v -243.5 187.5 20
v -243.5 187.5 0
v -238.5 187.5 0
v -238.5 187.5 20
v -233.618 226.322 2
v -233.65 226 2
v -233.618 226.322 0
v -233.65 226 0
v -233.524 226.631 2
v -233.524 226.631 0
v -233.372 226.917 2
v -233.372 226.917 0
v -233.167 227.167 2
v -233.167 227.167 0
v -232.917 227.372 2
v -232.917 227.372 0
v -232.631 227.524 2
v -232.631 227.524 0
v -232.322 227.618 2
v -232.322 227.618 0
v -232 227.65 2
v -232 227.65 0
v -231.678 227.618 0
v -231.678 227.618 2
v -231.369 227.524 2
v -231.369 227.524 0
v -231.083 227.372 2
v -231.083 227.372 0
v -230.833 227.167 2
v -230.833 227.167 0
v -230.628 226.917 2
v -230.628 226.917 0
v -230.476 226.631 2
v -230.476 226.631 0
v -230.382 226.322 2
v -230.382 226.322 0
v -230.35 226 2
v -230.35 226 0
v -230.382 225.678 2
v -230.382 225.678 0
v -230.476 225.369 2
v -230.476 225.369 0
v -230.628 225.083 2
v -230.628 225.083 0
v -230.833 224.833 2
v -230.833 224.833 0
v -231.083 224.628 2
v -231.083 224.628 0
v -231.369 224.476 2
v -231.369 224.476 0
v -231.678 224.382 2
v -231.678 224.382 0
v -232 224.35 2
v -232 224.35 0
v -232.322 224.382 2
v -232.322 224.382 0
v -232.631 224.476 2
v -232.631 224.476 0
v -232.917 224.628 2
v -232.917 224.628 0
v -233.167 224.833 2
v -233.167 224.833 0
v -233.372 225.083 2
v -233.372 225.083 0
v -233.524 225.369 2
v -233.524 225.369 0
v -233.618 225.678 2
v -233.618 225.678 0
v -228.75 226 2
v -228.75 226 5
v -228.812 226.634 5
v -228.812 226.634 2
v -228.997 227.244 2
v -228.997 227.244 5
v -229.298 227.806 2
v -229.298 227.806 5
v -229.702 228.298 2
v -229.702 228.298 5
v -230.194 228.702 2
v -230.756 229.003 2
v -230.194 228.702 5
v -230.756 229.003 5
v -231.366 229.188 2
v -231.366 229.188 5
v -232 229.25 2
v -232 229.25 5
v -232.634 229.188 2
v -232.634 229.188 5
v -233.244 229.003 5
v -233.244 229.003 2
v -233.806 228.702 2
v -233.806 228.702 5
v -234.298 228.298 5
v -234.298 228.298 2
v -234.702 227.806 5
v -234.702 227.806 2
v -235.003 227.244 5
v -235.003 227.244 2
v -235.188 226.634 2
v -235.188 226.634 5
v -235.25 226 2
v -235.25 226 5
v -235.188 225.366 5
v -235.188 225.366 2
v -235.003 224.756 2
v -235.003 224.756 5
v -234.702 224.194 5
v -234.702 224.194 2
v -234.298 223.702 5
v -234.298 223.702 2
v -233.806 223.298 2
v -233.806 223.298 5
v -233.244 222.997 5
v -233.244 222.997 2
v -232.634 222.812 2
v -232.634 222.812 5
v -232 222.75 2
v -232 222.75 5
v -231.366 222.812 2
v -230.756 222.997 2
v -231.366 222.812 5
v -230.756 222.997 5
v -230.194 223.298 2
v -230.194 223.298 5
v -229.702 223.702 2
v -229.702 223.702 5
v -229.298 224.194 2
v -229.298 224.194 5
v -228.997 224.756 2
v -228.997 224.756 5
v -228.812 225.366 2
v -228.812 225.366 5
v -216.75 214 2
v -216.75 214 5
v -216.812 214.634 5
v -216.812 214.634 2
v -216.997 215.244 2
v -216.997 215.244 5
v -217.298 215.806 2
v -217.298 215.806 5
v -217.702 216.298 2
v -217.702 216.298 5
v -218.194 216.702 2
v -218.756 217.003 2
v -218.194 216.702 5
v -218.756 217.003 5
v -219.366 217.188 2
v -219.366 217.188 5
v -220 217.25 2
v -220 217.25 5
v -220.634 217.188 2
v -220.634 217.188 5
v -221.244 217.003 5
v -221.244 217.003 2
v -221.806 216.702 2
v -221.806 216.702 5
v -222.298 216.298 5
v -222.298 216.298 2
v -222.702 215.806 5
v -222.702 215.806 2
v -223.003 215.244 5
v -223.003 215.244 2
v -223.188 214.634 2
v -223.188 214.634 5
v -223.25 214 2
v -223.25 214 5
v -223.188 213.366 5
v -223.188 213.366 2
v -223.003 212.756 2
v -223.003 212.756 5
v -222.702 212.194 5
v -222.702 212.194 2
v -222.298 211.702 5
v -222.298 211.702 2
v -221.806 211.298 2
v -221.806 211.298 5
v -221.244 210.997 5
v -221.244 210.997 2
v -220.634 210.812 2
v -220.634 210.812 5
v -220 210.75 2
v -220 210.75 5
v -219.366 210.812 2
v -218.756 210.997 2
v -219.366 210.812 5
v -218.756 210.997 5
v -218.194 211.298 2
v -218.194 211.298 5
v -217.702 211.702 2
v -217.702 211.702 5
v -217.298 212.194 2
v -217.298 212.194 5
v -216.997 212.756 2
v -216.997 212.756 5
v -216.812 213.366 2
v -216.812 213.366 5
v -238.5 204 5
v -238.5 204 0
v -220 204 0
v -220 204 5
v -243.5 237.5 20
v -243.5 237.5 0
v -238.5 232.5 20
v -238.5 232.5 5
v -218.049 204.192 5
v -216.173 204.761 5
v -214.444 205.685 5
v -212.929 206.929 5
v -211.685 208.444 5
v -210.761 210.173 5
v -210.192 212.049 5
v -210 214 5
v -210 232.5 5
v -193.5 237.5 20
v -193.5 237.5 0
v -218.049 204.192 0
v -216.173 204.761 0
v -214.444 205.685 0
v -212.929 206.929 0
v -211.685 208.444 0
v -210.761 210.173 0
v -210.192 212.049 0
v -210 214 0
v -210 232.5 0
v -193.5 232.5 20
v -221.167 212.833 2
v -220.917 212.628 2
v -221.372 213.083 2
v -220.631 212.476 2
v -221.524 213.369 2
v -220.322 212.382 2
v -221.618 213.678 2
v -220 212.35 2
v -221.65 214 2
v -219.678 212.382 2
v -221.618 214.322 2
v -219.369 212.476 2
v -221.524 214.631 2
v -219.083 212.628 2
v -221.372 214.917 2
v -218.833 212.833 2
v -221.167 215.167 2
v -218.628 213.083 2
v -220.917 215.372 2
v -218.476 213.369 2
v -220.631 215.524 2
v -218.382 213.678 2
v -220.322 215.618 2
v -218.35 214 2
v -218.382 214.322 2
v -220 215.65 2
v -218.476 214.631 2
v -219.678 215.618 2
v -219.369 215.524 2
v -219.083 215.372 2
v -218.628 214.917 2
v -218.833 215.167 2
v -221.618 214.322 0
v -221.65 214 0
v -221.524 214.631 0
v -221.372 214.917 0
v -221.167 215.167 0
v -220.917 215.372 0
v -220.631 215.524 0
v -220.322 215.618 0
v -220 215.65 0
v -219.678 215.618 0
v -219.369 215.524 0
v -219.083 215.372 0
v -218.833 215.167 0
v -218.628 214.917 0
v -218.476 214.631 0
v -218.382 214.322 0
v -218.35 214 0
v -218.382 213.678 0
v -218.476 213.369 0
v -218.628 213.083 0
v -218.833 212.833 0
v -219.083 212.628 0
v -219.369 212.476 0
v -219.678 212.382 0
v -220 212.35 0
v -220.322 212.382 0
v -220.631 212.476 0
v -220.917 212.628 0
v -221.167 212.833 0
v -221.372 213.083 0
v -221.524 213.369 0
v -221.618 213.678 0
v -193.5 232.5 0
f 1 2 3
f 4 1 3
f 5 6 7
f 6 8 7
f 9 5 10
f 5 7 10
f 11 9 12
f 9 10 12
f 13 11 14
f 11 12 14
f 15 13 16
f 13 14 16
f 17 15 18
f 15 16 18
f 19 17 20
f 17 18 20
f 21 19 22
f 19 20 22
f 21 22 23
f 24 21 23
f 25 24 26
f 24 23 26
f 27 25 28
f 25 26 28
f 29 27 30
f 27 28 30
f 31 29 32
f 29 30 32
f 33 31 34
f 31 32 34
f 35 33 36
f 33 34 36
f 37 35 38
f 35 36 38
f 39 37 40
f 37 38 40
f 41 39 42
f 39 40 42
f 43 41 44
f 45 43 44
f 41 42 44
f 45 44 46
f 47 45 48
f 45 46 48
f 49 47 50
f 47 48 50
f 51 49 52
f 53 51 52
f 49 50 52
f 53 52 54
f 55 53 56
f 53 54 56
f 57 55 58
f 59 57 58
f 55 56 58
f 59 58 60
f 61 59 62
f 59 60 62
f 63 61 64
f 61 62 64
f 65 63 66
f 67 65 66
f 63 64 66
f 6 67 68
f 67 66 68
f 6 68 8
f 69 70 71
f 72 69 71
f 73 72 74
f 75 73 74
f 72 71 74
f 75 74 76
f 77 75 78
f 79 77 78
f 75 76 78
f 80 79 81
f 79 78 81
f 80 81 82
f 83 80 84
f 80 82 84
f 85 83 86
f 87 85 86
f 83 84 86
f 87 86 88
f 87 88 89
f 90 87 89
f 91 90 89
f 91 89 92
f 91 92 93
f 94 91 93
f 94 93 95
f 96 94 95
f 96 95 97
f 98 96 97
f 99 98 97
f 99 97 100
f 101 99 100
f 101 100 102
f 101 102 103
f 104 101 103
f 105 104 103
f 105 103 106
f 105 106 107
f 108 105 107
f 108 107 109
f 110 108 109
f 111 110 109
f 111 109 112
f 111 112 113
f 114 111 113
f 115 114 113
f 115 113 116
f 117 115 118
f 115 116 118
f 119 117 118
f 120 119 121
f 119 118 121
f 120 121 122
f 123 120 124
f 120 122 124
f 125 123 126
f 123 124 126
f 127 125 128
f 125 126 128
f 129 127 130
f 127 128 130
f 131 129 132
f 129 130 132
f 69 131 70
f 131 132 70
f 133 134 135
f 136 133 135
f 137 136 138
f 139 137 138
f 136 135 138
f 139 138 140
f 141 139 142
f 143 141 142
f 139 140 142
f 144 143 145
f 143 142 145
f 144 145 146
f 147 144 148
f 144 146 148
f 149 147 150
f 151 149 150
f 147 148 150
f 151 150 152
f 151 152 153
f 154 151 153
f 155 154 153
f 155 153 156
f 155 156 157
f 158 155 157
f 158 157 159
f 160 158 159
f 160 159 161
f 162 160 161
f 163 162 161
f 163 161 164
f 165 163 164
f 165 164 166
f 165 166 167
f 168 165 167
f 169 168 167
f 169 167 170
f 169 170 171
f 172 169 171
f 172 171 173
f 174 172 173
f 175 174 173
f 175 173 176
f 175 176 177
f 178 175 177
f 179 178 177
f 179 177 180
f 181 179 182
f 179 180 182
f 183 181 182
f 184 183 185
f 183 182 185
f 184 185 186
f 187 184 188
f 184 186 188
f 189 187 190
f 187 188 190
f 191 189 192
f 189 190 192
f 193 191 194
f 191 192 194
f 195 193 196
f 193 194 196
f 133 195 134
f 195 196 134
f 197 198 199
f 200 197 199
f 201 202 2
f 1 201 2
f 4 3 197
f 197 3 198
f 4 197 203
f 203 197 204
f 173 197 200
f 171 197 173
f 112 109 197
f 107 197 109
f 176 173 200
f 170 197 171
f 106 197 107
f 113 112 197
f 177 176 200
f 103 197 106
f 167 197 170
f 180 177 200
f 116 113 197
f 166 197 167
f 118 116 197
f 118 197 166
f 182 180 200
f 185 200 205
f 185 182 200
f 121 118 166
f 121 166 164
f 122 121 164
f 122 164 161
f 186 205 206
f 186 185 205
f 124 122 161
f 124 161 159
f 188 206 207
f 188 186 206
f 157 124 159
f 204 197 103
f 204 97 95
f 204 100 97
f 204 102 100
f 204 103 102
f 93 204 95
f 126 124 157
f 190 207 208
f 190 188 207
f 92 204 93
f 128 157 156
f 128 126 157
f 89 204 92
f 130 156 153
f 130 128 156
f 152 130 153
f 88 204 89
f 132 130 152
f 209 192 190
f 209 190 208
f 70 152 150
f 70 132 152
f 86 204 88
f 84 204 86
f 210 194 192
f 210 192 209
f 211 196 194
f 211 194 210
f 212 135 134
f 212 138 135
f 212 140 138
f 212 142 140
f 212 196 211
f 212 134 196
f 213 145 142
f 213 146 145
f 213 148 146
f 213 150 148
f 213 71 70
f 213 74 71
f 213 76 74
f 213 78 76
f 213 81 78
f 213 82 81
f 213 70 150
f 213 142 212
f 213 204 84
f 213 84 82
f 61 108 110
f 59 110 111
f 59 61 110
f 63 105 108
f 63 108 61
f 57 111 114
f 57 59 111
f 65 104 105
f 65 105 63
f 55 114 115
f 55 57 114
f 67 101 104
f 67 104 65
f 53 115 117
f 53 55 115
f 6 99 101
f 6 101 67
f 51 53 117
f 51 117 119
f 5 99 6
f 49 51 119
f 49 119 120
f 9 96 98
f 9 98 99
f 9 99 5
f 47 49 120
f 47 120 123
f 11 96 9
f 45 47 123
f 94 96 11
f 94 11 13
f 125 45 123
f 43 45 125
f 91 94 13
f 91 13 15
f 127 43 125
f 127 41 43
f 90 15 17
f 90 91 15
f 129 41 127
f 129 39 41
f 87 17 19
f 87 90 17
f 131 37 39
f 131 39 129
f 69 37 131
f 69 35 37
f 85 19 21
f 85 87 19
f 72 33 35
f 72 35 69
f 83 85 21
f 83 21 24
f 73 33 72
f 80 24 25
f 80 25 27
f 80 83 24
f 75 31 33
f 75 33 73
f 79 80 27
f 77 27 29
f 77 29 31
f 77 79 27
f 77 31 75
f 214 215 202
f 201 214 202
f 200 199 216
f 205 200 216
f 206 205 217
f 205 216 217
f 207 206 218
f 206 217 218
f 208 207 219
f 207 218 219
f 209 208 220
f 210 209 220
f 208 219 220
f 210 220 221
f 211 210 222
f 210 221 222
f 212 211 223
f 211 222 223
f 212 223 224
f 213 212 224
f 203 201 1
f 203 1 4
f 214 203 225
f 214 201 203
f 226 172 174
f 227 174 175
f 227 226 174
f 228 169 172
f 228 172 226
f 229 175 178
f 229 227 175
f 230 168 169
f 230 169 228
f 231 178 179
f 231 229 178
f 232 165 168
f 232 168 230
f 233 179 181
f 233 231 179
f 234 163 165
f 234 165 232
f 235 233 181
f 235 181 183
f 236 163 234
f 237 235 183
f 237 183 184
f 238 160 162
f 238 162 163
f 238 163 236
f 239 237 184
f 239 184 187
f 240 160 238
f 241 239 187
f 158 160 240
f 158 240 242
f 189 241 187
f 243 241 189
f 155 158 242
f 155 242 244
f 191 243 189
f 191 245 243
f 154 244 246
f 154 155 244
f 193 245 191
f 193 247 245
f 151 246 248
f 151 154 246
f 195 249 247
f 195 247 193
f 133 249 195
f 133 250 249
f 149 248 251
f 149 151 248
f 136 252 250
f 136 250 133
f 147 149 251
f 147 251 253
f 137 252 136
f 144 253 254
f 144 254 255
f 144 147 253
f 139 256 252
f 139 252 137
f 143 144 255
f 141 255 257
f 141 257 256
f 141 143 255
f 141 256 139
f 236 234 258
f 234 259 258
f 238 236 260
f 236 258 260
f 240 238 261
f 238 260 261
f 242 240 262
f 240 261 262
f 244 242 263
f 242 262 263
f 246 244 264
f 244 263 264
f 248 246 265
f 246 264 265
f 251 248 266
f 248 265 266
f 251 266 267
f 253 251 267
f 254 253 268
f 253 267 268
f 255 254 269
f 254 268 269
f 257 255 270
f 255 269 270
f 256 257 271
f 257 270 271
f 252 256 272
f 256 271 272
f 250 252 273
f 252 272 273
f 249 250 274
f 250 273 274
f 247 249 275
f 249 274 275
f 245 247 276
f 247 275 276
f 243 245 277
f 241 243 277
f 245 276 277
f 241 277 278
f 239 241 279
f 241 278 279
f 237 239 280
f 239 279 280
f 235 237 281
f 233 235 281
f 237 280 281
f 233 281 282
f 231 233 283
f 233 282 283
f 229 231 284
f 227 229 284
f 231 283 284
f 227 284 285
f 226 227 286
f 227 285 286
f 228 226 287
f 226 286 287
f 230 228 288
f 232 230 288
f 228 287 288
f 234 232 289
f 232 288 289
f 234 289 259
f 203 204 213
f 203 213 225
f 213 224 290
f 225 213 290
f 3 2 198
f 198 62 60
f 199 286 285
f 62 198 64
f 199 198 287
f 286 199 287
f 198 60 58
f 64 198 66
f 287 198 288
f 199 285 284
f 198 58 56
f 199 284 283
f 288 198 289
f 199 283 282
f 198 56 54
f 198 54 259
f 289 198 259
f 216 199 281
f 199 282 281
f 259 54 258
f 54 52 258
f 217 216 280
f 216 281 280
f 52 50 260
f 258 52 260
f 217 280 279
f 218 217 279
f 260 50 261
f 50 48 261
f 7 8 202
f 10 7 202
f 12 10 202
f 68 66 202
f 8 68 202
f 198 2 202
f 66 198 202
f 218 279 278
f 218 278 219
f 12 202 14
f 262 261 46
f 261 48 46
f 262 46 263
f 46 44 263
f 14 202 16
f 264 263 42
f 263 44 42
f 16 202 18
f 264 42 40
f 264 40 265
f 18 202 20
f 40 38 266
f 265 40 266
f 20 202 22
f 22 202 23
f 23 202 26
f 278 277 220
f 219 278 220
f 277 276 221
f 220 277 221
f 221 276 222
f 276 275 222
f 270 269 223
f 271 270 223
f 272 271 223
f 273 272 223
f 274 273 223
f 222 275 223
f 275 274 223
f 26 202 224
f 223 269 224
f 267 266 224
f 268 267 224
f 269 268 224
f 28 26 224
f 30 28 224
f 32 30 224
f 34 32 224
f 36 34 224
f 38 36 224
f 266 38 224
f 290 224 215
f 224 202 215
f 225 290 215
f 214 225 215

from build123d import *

# Parameters (mm, degrees)
F4_DEPTH       = 5
F5_DEPTH       = 20
F7_D           = 3.3
F7_CBORE_D     = 6.5
F7_CBORE_DEPTH = 3


# Not quite as in the source:
# - the program builds the solid bodies; features that only make, move or delete a surface that nothing else refers to are left out


with BuildPart() as f4:
    # F3 (on Top) → F4 (new body)
    with BuildSketch(Plane.XY):
        Polygon((-193.5, 232.5), (-193.5, 237.5), (-243.5, 237.5), (-243.5, 187.5), (-238.5, 187.5), (-238.5, 204), (-238.5, 232.5), (-210, 232.5), align=None)
        with BuildLine():
            Line((-210, 214), (-210, 232.5))
            Line((-210, 232.5), (-238.5, 232.5))
            Line((-238.5, 232.5), (-238.5, 204))
            Line((-238.5, 204), (-220, 204))
            ThreePointArc((-220, 204), (-227.0710678119, 221.0710678119), (-210, 214))
        make_face()
        with BuildLine():
            ThreePointArc((-220, 204), (-212.9289321881, 206.9289321881), (-210, 214))
            ThreePointArc((-210, 214), (-227.0710678119, 221.0710678119), (-220, 204))
        make_face()
    extrude(amount=F4_DEPTH)

    # F3 (on Top) → F5 (join)
    with BuildSketch(Plane.XY):
        Polygon((-193.5, 232.5), (-193.5, 237.5), (-243.5, 237.5), (-243.5, 187.5), (-238.5, 187.5), (-238.5, 204), (-238.5, 232.5), (-210, 232.5), align=None)
    extrude(amount=F5_DEPTH)

    # F7 (through all)
    with Locations(Plane.XY.offset(5)):
        with Locations((-232, 226), (-220, 214)):
            CounterBoreHole(F7_D / 2, F7_CBORE_D / 2, F7_CBORE_DEPTH)


solid = f4.part
